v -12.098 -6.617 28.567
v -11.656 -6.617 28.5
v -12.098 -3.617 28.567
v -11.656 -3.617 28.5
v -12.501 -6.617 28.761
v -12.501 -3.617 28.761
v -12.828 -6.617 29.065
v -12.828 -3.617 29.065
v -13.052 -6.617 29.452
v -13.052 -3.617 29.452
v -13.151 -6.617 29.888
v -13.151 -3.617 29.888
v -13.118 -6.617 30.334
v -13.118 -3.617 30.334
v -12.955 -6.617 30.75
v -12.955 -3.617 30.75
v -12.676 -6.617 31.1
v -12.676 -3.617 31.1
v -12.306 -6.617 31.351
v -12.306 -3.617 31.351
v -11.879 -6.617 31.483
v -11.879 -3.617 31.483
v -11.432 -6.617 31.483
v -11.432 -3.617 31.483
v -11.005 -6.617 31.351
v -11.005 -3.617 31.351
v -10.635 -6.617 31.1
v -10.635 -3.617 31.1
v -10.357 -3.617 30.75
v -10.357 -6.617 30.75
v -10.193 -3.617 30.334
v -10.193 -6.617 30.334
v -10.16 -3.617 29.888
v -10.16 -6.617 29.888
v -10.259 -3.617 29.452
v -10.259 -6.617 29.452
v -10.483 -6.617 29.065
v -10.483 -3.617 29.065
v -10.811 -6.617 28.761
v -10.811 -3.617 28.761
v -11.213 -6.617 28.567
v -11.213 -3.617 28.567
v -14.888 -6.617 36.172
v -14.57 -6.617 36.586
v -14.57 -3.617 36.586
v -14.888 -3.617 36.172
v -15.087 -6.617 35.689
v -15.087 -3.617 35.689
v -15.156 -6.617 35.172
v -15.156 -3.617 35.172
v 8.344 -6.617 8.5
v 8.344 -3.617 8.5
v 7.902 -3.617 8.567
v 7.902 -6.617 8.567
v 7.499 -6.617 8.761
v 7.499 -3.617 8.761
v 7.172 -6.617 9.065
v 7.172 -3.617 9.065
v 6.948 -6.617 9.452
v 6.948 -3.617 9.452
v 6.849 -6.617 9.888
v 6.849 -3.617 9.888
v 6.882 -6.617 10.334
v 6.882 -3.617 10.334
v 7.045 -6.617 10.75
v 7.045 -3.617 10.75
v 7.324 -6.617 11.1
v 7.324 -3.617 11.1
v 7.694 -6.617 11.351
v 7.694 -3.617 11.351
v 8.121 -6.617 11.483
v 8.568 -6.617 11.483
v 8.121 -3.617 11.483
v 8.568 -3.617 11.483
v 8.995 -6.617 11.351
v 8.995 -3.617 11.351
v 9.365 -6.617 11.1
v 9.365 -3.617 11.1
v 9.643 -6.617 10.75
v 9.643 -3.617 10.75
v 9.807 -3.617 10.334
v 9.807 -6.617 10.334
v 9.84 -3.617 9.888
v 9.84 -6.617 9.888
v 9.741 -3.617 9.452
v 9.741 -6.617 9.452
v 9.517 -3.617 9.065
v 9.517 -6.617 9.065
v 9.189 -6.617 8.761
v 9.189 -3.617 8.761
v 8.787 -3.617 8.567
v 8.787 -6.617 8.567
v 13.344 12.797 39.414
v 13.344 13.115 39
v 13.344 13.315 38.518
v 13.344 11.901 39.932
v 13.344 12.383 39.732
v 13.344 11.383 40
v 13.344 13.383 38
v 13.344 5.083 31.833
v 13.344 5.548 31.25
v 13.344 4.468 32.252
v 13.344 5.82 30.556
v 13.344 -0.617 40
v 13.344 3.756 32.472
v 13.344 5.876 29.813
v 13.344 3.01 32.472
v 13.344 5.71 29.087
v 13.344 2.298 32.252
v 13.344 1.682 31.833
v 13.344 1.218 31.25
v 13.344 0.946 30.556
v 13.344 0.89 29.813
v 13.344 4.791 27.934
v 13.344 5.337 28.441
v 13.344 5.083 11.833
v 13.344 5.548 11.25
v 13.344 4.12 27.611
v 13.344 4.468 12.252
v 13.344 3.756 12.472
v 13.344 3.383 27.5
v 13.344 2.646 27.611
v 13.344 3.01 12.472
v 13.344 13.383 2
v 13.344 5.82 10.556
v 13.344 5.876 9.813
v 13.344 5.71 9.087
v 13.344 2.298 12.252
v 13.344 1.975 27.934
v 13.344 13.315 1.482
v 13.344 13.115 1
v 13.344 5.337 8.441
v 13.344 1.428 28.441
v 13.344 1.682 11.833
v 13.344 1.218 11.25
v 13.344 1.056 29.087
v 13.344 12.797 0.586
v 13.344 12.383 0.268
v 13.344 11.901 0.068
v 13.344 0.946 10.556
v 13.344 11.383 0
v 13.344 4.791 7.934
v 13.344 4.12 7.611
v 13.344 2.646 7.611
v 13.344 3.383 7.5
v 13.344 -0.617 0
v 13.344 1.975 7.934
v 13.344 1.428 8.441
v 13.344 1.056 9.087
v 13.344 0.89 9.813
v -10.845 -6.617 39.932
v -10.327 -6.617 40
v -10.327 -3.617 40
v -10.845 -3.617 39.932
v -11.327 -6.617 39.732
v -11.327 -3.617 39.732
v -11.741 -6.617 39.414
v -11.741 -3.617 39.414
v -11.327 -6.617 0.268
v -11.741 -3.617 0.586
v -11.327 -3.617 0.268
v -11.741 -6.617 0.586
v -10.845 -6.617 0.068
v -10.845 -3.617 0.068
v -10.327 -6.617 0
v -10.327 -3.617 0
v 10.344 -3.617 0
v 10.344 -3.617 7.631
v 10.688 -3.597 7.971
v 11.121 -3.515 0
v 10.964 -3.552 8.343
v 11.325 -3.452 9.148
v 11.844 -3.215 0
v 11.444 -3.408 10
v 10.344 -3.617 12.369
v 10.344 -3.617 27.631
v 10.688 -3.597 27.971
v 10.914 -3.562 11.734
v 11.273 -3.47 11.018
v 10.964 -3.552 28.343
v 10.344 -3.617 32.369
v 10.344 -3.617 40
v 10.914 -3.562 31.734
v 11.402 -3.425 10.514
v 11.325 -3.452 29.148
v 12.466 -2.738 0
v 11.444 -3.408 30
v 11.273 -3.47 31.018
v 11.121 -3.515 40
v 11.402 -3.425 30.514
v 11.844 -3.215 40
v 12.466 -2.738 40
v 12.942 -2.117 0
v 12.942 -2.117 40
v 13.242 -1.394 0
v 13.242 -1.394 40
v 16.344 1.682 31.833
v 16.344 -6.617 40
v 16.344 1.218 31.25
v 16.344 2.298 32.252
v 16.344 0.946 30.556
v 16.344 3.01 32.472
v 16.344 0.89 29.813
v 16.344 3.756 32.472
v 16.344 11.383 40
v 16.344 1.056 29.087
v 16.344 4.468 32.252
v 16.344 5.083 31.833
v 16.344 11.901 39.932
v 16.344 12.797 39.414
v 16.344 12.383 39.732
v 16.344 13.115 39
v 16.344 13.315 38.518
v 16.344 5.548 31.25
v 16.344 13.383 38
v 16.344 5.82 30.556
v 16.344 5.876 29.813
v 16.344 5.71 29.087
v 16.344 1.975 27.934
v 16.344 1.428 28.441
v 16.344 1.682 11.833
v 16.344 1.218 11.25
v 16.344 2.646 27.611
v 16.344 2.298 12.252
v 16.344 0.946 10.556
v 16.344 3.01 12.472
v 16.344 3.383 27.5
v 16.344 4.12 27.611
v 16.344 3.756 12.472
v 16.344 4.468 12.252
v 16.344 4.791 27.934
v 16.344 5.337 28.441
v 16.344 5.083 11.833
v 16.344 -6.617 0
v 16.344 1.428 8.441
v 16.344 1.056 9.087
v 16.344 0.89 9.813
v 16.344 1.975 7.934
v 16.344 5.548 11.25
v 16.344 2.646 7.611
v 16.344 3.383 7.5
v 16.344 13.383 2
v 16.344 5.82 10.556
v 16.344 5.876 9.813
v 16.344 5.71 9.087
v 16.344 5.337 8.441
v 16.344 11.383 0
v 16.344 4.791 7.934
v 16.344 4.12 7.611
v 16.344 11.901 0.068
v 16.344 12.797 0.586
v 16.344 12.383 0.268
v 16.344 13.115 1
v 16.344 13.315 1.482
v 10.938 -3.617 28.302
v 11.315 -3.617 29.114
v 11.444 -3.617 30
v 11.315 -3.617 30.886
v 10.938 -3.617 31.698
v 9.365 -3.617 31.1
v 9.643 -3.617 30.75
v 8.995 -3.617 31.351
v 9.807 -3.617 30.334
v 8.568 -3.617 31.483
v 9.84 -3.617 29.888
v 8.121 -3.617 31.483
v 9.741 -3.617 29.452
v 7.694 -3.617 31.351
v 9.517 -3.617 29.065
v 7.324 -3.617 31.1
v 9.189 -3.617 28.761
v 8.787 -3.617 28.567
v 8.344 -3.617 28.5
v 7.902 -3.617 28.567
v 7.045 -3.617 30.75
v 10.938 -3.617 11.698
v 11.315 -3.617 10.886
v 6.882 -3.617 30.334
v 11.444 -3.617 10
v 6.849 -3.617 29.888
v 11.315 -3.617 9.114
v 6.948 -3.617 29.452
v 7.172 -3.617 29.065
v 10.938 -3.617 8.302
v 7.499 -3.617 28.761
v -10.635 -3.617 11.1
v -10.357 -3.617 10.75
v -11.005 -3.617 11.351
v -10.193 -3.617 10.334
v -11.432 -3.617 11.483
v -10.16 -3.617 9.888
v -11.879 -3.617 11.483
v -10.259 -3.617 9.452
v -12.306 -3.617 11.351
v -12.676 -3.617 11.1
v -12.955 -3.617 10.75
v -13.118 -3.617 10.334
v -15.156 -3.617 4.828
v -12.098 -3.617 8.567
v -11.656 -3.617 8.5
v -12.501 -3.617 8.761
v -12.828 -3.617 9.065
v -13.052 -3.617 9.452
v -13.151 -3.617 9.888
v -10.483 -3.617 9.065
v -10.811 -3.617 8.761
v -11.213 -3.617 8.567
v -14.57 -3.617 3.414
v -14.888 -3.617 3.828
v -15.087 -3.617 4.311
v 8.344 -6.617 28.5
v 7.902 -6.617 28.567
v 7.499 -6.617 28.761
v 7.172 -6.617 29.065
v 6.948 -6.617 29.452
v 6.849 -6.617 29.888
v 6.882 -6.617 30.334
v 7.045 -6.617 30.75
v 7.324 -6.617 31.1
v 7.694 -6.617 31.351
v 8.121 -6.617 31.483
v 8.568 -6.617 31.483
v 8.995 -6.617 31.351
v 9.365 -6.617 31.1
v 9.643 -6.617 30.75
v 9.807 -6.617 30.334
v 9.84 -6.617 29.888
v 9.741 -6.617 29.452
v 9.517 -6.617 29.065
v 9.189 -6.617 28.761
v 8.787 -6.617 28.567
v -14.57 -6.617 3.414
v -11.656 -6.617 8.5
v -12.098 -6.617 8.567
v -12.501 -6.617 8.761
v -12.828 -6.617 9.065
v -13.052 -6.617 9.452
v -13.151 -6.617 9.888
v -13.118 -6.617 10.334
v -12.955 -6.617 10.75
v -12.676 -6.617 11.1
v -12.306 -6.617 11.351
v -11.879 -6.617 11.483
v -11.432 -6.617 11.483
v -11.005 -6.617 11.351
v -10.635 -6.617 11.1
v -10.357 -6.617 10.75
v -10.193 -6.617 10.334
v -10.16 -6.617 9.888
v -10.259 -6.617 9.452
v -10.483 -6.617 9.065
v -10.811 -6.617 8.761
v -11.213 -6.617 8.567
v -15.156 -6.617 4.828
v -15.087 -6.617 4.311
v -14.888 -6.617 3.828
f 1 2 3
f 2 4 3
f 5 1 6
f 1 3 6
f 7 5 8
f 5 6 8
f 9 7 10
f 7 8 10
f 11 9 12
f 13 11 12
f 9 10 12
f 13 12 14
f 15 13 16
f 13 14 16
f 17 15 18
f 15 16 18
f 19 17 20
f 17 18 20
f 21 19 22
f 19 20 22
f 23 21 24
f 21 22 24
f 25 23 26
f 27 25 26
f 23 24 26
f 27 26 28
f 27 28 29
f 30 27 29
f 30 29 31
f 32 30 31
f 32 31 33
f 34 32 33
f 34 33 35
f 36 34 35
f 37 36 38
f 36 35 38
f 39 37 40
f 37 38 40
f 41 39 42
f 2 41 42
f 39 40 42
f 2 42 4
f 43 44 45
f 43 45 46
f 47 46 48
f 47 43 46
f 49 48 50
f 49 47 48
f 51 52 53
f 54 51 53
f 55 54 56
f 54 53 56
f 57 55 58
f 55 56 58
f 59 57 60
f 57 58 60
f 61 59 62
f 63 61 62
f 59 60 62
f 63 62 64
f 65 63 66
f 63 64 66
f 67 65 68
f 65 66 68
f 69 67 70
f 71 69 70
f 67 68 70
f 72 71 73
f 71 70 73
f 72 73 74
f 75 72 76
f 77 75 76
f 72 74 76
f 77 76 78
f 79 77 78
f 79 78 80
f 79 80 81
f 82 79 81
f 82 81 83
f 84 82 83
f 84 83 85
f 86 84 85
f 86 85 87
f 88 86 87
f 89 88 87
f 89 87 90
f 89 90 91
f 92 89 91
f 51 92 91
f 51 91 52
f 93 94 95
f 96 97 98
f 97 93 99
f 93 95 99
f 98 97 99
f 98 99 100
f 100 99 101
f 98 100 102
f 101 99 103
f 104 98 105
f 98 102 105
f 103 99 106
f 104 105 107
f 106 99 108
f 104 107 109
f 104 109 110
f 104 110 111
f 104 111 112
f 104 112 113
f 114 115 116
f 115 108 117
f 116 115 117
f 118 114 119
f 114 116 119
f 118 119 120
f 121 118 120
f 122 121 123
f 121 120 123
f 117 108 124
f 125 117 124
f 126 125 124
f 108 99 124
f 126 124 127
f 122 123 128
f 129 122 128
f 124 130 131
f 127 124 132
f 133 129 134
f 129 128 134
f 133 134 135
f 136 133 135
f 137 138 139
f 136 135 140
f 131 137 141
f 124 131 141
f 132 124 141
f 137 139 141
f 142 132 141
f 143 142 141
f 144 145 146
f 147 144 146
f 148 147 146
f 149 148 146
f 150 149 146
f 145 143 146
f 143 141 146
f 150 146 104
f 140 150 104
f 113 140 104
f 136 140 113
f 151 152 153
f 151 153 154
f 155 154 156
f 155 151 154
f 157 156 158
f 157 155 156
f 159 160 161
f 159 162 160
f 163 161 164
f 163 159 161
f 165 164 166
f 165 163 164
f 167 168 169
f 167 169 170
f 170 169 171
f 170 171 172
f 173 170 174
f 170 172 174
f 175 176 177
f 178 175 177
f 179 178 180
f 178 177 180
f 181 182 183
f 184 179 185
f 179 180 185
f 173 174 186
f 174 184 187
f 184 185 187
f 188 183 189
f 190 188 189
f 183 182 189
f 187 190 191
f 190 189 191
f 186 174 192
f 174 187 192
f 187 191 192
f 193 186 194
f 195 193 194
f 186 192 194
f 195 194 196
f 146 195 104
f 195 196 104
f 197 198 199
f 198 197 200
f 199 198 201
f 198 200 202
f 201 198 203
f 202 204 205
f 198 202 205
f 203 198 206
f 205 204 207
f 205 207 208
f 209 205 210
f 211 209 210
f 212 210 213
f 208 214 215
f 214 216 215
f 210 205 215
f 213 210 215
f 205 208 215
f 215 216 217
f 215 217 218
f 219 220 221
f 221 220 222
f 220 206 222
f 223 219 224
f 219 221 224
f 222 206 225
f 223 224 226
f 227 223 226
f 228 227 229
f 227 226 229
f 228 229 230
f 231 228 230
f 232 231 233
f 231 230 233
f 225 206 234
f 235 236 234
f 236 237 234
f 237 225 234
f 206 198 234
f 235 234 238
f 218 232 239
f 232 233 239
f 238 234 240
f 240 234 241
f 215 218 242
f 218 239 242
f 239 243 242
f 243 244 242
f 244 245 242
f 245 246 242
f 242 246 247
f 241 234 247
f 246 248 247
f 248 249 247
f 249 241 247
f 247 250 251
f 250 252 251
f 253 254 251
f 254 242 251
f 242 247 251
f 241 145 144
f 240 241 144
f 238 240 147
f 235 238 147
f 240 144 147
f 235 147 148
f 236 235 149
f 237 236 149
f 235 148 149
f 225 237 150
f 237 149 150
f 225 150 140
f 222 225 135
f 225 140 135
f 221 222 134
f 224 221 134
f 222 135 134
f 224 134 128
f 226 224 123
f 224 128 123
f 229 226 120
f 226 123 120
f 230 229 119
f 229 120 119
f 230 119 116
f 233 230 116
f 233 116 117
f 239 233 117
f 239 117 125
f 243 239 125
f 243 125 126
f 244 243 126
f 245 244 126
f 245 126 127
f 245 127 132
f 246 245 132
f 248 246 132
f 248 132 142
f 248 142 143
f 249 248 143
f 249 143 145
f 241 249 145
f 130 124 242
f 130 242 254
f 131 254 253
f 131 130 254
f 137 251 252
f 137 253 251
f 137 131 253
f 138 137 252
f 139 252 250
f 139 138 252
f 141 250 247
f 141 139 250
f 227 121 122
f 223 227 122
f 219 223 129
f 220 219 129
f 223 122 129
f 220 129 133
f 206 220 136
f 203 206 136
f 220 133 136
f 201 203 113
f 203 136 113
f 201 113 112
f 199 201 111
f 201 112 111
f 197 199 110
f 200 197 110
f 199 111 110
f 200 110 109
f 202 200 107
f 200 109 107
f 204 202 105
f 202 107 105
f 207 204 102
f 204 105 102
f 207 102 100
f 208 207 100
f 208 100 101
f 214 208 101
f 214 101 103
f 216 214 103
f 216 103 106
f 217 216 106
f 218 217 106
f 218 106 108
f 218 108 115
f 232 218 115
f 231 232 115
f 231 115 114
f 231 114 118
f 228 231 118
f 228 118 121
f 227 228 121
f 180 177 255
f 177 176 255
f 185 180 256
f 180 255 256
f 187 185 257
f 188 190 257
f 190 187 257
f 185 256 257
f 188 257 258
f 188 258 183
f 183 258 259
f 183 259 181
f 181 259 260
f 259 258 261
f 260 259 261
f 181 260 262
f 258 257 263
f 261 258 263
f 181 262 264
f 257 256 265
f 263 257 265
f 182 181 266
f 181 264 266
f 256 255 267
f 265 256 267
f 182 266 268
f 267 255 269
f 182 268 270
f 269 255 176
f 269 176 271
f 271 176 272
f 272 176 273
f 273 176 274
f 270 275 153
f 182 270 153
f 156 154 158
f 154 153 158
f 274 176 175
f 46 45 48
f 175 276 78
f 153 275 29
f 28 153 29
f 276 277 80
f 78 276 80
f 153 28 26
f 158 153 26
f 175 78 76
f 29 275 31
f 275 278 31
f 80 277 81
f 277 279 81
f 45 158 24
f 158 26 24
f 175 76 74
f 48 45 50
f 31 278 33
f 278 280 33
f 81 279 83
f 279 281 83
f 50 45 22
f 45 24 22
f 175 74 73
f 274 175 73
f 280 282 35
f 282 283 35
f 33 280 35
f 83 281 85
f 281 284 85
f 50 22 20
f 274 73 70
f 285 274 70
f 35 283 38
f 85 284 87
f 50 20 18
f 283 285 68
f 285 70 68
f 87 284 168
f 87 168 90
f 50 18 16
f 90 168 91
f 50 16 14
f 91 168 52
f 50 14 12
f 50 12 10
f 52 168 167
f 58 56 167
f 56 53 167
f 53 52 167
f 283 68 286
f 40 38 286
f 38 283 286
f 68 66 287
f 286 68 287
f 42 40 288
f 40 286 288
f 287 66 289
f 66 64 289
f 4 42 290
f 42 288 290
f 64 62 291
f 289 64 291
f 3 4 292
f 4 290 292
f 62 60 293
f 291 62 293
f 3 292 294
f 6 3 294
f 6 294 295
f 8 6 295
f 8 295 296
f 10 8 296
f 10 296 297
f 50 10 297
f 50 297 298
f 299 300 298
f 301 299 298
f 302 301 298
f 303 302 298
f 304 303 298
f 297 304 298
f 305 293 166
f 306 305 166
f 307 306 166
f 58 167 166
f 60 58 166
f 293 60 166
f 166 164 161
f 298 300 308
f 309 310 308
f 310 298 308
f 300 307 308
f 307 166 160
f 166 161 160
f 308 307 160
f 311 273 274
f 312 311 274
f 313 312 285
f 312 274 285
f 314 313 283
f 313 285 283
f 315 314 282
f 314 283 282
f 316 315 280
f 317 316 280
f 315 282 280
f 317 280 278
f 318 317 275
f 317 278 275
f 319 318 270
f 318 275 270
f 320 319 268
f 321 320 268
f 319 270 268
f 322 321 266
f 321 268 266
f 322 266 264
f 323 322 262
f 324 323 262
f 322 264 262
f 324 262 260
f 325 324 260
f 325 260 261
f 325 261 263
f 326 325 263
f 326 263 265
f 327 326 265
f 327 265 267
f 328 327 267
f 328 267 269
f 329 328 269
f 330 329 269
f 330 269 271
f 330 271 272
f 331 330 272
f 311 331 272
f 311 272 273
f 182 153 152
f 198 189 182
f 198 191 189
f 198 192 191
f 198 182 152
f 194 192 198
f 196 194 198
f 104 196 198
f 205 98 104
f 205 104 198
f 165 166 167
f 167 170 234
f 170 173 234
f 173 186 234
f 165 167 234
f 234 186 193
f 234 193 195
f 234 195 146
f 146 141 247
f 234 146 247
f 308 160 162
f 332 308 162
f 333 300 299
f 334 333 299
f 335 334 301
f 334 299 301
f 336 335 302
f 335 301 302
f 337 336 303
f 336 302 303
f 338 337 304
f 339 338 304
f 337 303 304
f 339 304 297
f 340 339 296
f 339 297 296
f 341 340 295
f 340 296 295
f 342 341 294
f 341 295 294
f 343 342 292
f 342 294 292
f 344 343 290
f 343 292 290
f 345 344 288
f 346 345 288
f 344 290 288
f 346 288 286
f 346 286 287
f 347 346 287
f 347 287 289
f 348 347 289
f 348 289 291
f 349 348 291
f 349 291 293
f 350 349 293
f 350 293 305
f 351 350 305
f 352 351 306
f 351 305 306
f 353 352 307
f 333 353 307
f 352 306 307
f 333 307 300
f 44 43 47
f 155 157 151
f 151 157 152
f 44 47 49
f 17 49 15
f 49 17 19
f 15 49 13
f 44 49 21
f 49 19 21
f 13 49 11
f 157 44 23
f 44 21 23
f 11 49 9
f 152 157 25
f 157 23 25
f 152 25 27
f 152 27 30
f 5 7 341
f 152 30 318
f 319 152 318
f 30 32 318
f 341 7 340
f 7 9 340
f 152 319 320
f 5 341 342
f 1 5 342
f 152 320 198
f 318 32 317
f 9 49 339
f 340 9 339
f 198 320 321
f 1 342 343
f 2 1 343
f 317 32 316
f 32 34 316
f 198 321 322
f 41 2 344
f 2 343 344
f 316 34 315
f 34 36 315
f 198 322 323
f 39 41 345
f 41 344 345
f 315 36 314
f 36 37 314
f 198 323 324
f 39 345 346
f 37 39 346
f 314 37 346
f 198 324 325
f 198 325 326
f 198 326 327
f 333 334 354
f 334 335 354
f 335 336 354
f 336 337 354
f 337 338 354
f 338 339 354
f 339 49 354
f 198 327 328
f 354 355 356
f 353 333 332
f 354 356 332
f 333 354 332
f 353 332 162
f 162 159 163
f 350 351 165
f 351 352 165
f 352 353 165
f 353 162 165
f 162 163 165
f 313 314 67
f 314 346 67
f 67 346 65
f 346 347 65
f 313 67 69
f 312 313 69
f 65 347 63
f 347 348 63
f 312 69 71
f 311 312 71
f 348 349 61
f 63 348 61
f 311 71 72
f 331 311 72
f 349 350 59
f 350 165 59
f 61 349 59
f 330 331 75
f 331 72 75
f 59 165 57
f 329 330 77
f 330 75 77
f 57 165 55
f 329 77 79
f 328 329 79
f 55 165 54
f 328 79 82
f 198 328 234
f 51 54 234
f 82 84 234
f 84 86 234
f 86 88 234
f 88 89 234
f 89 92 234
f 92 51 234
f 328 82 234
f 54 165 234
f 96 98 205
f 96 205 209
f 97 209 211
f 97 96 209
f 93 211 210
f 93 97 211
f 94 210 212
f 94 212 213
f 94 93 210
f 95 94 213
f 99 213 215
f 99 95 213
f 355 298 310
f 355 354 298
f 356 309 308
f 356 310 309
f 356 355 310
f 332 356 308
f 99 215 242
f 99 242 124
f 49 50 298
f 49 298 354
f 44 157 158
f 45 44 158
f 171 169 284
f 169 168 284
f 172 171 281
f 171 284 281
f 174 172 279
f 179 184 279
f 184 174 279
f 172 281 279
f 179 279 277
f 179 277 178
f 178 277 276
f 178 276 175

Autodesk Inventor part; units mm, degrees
ref_plane "YZ Plane" through (0, 0, 0) normal (1, 0, 0) x (0, 1, 0)
ref_plane "XZ Plane" through (0, 0, 0) normal (0, 1, 0) x (-1, 0, 0)
ref_plane "XY Plane" through (0, 0, 0) normal (0, 0, 1) x (1, 0, 0)
sketch "Szkic1" plane through (0, 0, 0) normal (0, 0, 1) x (1, 0, 0)
  line L0 (-15.1556, -3.6171) -> (-15.1556, -6.6171)
  line L1 (-15.1556, -6.6171) -> (16.3444, -6.6171)
  line L2 (16.3444, -6.6171) -> (16.3444, 13.3829)
  line L3 (16.3444, 13.3829) -> (13.3444, 13.3829)
  line L4 (13.3444, 13.3829) -> (13.3444, -3.6171)
  line L5 (13.3444, -3.6171) -> (-15.1556, -3.6171)
  point P0 (0, 0)
  dimension "d0" = 3
  dimension "d1" = 31.5
  dimension "d2" = 20
  dimension "d3" = 3
extrude "Wyciągnięcie proste1" add sketch "Szkic1" along normal blind 40
fillet "Zaokrąglenie1" radius 3 1 edges at (13.3444, -3.6171, 20)
fillet "Zaokrąglenie3" radius 2 2 edges at (14.8444, 13.3829, 40) (14.8444, 13.3829, 0)
sketch "Szkic4" plane through (-15.1556, -6.6171, 0) normal (0, -1, 0) x (1, 0, 0)
  line L0 (0, 0) -> (31.5, 0) projected
  line L1 (31.5, 0) -> (31.5, 40) projected
  line L2 (0, 40) -> (31.5, 40) projected
  line L3 (0, 0) -> (0, 40) projected
  line L4 (31.5, 36.2) -> (-0.3213, 36.2)
  line L5 (31.5, 2) -> (31.5, 38) projected
  line L6 (31.5, 3.8) -> (0, 3.8)
  line L7 (0, 0) -> (0, 40) projected
  line L8 (27, 36.2) -> (27, 3.8)
  point P0 (15.1556, 0)
  point P1 (23.5, 30)
  point P2 (3.5, 30)
  point P3 (23.5, 10)
  point P4 (3.5, 10)
  dimension "d47" = 32.4
  dimension "d48" = 3.8
  dimension "d50" = 3.5
  dimension "d51" = 3.5
  dimension "d53" = 6.2
  dimension "d54" = 6.2
  dimension "d55" = 6.2
  dimension "d56" = 6.2
  dimension "d68" = 4.5
  dimension "d69" = 3.5
  dimension "d70" = 3.5
  dimension "d78" = 27
sketch "Szkic5" plane through (16.3444, -6.6171, 40) normal (1, 0, 0) x (0, 0, -1)
  arc A0 (40, 18) -> (38, 20) centre (38, 18) ccw projected
  line L0 (38, 20) -> (2, 20) projected
  arc A1 (2, 20) -> (0, 18) centre (2, 18) ccw projected
  line L1 (0, 0) -> (0, 18) projected
  line L2 (40, 0) -> (0, 0) projected
  line L3 (40, 0) -> (40, 18) projected
  point P0 (40, 6.6171)
  point P1 (10, 10)
  point P2 (30, 10)
  dimension "d57" = 10
  dimension "d58" = 10
  dimension "d59" = 10
  dimension "d60" = 10
hole "Otwór3" at (16.3444, 3.3829, 30) at (16.3444, 3.3829, 10) direction (-1, 0, 0) diameter 5 end through all
hole "Otwór4" at (8.3444, -6.6171, 30) at (-11.6556, -6.6171, 30) at (8.3444, -6.6171, 10) at (-11.6556, -6.6171, 10) direction (0, 1, 0) diameter 3 end through all
sketch "Szkic6" plane through (-15.1556, -3.6171, 40) normal (0, 1, 0) x (1, 0, 0)
  circle A0 centre (23.5, 10) radius 1.5 projected
  circle A1 centre (23.5, 30) radius 1.5 projected
  circle A2 centre (23.5, 10) radius 1.5 projected
  circle A3 centre (23.5, 10) radius 3.1
  circle A4 centre (23.5, 30) radius 3.1
  point P0 (15.1556, 40)
  dimension "d79" = 6.2
  dimension "d80" = 6.2
extrude "Wyciągnięcie proste3" cut sketch "Szkic6" along normal blind 10
chamfer "Faza3" distance 4 angle 45 2 edges at (-15.1556, -5.1171, 40) (-15.1556, -5.1171, 0)
fillet "Zaokrąglenie4" radius 2 4 edges at (-15.1556, -5.1171, 36) (-11.1556, -5.1171, 40) (-15.1556, -5.1171, 4) (-11.1556, -5.1171, 0)
equation "\"d50\" = d69"
equation "\"d51\" = d69"
equation "\"d54\" = d53"
equation "\"d55\" = d53"
equation "\"d56\" = d53"
equation "\"d70\" = d69"
equation "\"d58\" = d57"
equation "\"d59\" = d57"
equation "\"d60\" = d59"
properties part number "CNCM_ALU_X_Y_AXis_Mounting_Bracket"
